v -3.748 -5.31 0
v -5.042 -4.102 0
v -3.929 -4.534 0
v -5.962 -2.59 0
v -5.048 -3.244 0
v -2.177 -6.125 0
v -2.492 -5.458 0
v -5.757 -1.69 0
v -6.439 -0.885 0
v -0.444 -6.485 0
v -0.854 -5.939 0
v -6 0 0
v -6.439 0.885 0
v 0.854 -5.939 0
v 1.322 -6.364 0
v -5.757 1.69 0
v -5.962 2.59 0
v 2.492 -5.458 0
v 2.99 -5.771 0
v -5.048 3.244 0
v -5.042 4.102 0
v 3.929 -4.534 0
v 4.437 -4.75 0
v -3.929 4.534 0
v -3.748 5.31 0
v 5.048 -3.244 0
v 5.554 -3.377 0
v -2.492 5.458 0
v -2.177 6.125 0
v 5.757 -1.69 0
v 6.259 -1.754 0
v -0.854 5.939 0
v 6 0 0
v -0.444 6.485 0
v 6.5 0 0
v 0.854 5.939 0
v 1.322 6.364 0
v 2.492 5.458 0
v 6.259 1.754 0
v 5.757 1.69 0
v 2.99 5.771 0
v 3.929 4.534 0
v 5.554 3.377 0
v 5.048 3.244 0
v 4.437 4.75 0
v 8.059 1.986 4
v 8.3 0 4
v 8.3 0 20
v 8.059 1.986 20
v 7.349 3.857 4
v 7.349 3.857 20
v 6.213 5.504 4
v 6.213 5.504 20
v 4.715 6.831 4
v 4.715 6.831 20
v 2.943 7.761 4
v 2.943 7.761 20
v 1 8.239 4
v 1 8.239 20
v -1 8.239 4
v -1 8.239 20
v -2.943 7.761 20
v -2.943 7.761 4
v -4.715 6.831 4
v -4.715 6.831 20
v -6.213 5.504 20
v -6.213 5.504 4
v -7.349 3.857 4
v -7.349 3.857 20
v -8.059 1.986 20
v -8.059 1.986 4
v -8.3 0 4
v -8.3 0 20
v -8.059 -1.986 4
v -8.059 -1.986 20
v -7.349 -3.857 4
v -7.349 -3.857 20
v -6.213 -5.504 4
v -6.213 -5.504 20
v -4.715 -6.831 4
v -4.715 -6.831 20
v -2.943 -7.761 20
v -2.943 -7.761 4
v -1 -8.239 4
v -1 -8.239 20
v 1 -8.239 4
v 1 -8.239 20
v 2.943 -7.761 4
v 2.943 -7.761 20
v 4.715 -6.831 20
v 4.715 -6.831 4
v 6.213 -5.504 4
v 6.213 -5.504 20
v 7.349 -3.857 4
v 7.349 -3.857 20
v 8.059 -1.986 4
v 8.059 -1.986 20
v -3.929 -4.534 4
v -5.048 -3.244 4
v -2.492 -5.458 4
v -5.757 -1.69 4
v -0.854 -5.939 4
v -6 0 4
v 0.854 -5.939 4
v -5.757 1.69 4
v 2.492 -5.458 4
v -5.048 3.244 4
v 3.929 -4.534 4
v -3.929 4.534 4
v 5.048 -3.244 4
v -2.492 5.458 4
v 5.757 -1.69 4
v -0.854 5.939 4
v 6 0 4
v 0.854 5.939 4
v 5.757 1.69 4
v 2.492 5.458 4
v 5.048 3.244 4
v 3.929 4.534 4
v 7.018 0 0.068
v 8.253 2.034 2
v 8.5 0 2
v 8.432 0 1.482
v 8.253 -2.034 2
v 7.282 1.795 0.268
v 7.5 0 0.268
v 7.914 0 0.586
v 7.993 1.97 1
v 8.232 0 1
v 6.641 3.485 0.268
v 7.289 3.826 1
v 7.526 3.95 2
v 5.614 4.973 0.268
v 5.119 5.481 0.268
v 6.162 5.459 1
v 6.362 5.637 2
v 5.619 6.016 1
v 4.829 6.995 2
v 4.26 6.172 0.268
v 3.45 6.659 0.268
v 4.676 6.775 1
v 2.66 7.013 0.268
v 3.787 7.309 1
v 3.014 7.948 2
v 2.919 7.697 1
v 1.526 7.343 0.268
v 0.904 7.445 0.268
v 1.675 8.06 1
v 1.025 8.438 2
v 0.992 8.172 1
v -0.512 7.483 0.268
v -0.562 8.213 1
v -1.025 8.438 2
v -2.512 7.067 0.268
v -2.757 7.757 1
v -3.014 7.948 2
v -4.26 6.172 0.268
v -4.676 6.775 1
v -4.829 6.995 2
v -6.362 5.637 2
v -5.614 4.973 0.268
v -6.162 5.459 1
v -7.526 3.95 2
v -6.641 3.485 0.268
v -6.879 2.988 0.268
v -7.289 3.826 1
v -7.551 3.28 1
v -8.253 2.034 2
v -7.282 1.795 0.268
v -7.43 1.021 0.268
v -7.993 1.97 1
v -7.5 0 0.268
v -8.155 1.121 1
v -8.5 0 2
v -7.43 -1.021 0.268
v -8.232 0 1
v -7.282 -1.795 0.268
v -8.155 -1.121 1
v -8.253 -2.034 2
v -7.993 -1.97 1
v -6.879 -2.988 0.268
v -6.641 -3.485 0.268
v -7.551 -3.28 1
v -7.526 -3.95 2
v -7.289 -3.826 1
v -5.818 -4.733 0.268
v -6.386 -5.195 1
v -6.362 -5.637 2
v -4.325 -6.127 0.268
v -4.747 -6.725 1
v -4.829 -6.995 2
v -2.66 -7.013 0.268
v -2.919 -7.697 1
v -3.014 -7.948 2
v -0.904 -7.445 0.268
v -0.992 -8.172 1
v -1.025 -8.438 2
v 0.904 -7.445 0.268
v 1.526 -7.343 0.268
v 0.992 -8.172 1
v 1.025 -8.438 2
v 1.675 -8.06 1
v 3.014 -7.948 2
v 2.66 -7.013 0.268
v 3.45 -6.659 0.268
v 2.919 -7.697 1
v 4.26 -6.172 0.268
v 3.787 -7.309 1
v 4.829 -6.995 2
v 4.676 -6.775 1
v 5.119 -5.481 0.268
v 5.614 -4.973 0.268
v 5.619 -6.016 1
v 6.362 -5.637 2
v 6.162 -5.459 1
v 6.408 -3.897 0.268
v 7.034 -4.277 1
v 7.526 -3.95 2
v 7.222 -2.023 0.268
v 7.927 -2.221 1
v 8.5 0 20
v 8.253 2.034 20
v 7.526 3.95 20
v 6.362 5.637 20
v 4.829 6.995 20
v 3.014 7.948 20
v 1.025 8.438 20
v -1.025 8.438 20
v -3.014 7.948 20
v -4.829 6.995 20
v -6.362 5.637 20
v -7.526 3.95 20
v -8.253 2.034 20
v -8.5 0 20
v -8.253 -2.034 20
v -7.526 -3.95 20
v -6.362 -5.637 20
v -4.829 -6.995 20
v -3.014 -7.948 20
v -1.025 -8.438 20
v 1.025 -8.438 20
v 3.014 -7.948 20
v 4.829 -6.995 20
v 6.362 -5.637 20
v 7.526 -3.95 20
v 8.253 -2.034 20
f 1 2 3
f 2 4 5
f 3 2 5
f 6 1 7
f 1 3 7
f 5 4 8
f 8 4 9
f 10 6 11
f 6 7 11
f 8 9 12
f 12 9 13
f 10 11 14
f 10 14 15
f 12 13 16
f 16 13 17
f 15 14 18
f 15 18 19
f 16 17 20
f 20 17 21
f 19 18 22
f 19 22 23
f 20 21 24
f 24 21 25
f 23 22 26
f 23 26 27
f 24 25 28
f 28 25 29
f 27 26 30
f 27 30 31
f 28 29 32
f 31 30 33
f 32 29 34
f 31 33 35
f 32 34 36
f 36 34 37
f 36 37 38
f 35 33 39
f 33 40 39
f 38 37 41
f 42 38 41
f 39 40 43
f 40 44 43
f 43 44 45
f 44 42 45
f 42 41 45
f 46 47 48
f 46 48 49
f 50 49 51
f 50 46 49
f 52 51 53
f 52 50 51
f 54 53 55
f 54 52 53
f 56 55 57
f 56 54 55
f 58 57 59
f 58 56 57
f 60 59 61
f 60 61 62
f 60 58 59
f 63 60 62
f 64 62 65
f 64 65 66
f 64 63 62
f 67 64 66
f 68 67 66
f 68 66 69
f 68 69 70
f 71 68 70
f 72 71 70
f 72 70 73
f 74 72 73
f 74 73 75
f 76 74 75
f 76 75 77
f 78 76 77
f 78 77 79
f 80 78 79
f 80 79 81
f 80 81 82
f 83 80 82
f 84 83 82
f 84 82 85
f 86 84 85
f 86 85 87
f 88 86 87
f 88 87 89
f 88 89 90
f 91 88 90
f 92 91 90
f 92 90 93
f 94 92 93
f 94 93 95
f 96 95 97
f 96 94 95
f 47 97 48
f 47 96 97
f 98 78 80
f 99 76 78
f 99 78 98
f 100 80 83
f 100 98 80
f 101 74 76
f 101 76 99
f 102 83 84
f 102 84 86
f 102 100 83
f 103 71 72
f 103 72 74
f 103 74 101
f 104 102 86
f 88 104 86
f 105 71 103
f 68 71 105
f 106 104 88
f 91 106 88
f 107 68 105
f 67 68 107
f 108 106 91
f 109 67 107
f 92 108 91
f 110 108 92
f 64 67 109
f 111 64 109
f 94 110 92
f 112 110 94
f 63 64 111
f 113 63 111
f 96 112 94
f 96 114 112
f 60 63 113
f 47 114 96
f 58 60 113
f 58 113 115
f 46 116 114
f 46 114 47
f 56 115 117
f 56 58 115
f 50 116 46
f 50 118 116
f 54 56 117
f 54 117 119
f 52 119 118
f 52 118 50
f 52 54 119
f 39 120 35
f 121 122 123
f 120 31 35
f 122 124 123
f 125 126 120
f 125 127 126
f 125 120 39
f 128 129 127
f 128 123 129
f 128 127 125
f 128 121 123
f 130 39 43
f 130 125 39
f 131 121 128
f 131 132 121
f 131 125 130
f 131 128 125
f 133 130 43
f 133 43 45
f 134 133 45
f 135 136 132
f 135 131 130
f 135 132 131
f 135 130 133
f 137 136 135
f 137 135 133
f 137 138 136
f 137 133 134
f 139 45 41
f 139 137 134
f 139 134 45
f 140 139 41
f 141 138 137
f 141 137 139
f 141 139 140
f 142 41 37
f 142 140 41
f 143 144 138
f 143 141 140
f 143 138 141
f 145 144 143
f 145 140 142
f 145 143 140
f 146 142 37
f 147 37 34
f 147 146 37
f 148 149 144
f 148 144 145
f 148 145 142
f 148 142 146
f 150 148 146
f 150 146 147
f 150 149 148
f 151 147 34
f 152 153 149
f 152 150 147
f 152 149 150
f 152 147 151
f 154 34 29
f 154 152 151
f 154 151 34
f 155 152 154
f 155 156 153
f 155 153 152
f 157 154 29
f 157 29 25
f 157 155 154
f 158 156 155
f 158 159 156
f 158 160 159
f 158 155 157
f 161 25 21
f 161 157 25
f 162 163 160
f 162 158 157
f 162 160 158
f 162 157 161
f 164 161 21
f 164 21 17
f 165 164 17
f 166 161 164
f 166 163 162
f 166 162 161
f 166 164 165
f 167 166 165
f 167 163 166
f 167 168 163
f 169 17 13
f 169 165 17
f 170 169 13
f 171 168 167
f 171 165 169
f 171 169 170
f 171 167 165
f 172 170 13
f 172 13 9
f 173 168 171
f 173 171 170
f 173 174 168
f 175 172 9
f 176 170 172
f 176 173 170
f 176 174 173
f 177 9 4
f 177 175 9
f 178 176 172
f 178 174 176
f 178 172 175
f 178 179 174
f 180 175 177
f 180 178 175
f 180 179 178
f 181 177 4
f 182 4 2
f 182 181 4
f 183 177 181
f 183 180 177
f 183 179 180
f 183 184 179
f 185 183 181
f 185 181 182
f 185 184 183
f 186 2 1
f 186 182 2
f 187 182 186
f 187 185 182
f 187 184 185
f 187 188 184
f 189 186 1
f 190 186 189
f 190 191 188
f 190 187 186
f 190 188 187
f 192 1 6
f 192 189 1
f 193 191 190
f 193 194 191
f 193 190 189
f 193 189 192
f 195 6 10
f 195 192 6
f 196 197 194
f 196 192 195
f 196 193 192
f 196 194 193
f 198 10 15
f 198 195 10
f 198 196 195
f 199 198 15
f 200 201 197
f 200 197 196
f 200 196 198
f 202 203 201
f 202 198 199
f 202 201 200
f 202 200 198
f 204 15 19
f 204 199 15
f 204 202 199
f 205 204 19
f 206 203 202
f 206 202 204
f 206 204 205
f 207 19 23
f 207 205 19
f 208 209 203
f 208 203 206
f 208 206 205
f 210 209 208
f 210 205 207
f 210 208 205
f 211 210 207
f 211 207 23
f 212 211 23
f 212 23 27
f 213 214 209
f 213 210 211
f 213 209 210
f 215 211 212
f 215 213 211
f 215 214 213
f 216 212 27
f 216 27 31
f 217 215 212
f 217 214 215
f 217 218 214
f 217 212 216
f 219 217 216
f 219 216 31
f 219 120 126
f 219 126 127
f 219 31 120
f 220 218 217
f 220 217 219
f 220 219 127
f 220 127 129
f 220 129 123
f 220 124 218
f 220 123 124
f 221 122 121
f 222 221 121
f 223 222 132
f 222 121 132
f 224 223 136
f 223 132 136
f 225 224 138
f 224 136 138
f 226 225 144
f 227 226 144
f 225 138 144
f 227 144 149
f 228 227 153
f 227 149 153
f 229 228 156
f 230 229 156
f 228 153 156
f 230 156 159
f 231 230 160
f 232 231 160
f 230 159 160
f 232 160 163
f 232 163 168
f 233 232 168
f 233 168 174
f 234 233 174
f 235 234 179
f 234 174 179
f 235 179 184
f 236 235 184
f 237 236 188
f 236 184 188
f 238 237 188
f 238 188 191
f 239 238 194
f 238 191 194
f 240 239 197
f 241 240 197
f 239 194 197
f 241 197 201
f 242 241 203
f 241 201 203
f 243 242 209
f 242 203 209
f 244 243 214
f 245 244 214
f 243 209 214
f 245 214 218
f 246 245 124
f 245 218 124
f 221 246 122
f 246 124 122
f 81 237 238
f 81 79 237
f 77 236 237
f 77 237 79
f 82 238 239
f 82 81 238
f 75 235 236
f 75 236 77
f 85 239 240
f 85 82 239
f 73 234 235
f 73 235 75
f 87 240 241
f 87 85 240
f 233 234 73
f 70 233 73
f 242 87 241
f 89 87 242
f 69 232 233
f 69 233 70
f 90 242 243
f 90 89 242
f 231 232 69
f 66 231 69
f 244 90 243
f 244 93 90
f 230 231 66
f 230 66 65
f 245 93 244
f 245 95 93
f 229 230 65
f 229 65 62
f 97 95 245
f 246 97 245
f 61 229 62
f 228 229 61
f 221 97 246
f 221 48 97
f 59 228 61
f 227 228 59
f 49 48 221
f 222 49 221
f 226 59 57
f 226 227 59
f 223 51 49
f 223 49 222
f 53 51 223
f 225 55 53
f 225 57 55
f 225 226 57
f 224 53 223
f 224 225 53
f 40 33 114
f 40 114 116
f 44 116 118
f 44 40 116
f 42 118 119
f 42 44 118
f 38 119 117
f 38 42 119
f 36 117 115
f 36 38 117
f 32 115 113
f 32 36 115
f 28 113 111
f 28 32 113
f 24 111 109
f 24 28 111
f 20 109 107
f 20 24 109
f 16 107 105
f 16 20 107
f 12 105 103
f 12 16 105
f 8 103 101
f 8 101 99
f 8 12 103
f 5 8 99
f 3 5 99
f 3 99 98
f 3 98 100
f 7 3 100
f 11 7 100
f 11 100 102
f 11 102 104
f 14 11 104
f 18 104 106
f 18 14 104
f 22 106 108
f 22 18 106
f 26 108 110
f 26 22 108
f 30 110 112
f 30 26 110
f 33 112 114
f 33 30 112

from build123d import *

# Parameters (mm, degrees)
F0_R     = 8.5
F0_R_2   = 8.3
F1_DEPTH = 20
F0_R_3   = 6
F2_DEPTH = 4
F3_R     = 2


with BuildPart() as f1:
    # F0 (on Top) → F1 (new body)
    with BuildSketch(Plane.XY):
        Circle(F0_R)
        Circle(F0_R_2, mode=Mode.SUBTRACT)
    extrude(amount=F1_DEPTH)

    # F0 (on Top) → F2 (join)
    with BuildSketch(Plane.XY):
        Circle(F0_R_2)
        Circle(F0_R_3, mode=Mode.SUBTRACT)
    extrude(amount=F2_DEPTH)

    # F3
    f3_edges = [f1.edges().sort_by_distance(p)[0] for p in [
        (-8.5, 0, 0),
    ]]
    fillet(f3_edges, radius=F3_R)


solid = f1.part
